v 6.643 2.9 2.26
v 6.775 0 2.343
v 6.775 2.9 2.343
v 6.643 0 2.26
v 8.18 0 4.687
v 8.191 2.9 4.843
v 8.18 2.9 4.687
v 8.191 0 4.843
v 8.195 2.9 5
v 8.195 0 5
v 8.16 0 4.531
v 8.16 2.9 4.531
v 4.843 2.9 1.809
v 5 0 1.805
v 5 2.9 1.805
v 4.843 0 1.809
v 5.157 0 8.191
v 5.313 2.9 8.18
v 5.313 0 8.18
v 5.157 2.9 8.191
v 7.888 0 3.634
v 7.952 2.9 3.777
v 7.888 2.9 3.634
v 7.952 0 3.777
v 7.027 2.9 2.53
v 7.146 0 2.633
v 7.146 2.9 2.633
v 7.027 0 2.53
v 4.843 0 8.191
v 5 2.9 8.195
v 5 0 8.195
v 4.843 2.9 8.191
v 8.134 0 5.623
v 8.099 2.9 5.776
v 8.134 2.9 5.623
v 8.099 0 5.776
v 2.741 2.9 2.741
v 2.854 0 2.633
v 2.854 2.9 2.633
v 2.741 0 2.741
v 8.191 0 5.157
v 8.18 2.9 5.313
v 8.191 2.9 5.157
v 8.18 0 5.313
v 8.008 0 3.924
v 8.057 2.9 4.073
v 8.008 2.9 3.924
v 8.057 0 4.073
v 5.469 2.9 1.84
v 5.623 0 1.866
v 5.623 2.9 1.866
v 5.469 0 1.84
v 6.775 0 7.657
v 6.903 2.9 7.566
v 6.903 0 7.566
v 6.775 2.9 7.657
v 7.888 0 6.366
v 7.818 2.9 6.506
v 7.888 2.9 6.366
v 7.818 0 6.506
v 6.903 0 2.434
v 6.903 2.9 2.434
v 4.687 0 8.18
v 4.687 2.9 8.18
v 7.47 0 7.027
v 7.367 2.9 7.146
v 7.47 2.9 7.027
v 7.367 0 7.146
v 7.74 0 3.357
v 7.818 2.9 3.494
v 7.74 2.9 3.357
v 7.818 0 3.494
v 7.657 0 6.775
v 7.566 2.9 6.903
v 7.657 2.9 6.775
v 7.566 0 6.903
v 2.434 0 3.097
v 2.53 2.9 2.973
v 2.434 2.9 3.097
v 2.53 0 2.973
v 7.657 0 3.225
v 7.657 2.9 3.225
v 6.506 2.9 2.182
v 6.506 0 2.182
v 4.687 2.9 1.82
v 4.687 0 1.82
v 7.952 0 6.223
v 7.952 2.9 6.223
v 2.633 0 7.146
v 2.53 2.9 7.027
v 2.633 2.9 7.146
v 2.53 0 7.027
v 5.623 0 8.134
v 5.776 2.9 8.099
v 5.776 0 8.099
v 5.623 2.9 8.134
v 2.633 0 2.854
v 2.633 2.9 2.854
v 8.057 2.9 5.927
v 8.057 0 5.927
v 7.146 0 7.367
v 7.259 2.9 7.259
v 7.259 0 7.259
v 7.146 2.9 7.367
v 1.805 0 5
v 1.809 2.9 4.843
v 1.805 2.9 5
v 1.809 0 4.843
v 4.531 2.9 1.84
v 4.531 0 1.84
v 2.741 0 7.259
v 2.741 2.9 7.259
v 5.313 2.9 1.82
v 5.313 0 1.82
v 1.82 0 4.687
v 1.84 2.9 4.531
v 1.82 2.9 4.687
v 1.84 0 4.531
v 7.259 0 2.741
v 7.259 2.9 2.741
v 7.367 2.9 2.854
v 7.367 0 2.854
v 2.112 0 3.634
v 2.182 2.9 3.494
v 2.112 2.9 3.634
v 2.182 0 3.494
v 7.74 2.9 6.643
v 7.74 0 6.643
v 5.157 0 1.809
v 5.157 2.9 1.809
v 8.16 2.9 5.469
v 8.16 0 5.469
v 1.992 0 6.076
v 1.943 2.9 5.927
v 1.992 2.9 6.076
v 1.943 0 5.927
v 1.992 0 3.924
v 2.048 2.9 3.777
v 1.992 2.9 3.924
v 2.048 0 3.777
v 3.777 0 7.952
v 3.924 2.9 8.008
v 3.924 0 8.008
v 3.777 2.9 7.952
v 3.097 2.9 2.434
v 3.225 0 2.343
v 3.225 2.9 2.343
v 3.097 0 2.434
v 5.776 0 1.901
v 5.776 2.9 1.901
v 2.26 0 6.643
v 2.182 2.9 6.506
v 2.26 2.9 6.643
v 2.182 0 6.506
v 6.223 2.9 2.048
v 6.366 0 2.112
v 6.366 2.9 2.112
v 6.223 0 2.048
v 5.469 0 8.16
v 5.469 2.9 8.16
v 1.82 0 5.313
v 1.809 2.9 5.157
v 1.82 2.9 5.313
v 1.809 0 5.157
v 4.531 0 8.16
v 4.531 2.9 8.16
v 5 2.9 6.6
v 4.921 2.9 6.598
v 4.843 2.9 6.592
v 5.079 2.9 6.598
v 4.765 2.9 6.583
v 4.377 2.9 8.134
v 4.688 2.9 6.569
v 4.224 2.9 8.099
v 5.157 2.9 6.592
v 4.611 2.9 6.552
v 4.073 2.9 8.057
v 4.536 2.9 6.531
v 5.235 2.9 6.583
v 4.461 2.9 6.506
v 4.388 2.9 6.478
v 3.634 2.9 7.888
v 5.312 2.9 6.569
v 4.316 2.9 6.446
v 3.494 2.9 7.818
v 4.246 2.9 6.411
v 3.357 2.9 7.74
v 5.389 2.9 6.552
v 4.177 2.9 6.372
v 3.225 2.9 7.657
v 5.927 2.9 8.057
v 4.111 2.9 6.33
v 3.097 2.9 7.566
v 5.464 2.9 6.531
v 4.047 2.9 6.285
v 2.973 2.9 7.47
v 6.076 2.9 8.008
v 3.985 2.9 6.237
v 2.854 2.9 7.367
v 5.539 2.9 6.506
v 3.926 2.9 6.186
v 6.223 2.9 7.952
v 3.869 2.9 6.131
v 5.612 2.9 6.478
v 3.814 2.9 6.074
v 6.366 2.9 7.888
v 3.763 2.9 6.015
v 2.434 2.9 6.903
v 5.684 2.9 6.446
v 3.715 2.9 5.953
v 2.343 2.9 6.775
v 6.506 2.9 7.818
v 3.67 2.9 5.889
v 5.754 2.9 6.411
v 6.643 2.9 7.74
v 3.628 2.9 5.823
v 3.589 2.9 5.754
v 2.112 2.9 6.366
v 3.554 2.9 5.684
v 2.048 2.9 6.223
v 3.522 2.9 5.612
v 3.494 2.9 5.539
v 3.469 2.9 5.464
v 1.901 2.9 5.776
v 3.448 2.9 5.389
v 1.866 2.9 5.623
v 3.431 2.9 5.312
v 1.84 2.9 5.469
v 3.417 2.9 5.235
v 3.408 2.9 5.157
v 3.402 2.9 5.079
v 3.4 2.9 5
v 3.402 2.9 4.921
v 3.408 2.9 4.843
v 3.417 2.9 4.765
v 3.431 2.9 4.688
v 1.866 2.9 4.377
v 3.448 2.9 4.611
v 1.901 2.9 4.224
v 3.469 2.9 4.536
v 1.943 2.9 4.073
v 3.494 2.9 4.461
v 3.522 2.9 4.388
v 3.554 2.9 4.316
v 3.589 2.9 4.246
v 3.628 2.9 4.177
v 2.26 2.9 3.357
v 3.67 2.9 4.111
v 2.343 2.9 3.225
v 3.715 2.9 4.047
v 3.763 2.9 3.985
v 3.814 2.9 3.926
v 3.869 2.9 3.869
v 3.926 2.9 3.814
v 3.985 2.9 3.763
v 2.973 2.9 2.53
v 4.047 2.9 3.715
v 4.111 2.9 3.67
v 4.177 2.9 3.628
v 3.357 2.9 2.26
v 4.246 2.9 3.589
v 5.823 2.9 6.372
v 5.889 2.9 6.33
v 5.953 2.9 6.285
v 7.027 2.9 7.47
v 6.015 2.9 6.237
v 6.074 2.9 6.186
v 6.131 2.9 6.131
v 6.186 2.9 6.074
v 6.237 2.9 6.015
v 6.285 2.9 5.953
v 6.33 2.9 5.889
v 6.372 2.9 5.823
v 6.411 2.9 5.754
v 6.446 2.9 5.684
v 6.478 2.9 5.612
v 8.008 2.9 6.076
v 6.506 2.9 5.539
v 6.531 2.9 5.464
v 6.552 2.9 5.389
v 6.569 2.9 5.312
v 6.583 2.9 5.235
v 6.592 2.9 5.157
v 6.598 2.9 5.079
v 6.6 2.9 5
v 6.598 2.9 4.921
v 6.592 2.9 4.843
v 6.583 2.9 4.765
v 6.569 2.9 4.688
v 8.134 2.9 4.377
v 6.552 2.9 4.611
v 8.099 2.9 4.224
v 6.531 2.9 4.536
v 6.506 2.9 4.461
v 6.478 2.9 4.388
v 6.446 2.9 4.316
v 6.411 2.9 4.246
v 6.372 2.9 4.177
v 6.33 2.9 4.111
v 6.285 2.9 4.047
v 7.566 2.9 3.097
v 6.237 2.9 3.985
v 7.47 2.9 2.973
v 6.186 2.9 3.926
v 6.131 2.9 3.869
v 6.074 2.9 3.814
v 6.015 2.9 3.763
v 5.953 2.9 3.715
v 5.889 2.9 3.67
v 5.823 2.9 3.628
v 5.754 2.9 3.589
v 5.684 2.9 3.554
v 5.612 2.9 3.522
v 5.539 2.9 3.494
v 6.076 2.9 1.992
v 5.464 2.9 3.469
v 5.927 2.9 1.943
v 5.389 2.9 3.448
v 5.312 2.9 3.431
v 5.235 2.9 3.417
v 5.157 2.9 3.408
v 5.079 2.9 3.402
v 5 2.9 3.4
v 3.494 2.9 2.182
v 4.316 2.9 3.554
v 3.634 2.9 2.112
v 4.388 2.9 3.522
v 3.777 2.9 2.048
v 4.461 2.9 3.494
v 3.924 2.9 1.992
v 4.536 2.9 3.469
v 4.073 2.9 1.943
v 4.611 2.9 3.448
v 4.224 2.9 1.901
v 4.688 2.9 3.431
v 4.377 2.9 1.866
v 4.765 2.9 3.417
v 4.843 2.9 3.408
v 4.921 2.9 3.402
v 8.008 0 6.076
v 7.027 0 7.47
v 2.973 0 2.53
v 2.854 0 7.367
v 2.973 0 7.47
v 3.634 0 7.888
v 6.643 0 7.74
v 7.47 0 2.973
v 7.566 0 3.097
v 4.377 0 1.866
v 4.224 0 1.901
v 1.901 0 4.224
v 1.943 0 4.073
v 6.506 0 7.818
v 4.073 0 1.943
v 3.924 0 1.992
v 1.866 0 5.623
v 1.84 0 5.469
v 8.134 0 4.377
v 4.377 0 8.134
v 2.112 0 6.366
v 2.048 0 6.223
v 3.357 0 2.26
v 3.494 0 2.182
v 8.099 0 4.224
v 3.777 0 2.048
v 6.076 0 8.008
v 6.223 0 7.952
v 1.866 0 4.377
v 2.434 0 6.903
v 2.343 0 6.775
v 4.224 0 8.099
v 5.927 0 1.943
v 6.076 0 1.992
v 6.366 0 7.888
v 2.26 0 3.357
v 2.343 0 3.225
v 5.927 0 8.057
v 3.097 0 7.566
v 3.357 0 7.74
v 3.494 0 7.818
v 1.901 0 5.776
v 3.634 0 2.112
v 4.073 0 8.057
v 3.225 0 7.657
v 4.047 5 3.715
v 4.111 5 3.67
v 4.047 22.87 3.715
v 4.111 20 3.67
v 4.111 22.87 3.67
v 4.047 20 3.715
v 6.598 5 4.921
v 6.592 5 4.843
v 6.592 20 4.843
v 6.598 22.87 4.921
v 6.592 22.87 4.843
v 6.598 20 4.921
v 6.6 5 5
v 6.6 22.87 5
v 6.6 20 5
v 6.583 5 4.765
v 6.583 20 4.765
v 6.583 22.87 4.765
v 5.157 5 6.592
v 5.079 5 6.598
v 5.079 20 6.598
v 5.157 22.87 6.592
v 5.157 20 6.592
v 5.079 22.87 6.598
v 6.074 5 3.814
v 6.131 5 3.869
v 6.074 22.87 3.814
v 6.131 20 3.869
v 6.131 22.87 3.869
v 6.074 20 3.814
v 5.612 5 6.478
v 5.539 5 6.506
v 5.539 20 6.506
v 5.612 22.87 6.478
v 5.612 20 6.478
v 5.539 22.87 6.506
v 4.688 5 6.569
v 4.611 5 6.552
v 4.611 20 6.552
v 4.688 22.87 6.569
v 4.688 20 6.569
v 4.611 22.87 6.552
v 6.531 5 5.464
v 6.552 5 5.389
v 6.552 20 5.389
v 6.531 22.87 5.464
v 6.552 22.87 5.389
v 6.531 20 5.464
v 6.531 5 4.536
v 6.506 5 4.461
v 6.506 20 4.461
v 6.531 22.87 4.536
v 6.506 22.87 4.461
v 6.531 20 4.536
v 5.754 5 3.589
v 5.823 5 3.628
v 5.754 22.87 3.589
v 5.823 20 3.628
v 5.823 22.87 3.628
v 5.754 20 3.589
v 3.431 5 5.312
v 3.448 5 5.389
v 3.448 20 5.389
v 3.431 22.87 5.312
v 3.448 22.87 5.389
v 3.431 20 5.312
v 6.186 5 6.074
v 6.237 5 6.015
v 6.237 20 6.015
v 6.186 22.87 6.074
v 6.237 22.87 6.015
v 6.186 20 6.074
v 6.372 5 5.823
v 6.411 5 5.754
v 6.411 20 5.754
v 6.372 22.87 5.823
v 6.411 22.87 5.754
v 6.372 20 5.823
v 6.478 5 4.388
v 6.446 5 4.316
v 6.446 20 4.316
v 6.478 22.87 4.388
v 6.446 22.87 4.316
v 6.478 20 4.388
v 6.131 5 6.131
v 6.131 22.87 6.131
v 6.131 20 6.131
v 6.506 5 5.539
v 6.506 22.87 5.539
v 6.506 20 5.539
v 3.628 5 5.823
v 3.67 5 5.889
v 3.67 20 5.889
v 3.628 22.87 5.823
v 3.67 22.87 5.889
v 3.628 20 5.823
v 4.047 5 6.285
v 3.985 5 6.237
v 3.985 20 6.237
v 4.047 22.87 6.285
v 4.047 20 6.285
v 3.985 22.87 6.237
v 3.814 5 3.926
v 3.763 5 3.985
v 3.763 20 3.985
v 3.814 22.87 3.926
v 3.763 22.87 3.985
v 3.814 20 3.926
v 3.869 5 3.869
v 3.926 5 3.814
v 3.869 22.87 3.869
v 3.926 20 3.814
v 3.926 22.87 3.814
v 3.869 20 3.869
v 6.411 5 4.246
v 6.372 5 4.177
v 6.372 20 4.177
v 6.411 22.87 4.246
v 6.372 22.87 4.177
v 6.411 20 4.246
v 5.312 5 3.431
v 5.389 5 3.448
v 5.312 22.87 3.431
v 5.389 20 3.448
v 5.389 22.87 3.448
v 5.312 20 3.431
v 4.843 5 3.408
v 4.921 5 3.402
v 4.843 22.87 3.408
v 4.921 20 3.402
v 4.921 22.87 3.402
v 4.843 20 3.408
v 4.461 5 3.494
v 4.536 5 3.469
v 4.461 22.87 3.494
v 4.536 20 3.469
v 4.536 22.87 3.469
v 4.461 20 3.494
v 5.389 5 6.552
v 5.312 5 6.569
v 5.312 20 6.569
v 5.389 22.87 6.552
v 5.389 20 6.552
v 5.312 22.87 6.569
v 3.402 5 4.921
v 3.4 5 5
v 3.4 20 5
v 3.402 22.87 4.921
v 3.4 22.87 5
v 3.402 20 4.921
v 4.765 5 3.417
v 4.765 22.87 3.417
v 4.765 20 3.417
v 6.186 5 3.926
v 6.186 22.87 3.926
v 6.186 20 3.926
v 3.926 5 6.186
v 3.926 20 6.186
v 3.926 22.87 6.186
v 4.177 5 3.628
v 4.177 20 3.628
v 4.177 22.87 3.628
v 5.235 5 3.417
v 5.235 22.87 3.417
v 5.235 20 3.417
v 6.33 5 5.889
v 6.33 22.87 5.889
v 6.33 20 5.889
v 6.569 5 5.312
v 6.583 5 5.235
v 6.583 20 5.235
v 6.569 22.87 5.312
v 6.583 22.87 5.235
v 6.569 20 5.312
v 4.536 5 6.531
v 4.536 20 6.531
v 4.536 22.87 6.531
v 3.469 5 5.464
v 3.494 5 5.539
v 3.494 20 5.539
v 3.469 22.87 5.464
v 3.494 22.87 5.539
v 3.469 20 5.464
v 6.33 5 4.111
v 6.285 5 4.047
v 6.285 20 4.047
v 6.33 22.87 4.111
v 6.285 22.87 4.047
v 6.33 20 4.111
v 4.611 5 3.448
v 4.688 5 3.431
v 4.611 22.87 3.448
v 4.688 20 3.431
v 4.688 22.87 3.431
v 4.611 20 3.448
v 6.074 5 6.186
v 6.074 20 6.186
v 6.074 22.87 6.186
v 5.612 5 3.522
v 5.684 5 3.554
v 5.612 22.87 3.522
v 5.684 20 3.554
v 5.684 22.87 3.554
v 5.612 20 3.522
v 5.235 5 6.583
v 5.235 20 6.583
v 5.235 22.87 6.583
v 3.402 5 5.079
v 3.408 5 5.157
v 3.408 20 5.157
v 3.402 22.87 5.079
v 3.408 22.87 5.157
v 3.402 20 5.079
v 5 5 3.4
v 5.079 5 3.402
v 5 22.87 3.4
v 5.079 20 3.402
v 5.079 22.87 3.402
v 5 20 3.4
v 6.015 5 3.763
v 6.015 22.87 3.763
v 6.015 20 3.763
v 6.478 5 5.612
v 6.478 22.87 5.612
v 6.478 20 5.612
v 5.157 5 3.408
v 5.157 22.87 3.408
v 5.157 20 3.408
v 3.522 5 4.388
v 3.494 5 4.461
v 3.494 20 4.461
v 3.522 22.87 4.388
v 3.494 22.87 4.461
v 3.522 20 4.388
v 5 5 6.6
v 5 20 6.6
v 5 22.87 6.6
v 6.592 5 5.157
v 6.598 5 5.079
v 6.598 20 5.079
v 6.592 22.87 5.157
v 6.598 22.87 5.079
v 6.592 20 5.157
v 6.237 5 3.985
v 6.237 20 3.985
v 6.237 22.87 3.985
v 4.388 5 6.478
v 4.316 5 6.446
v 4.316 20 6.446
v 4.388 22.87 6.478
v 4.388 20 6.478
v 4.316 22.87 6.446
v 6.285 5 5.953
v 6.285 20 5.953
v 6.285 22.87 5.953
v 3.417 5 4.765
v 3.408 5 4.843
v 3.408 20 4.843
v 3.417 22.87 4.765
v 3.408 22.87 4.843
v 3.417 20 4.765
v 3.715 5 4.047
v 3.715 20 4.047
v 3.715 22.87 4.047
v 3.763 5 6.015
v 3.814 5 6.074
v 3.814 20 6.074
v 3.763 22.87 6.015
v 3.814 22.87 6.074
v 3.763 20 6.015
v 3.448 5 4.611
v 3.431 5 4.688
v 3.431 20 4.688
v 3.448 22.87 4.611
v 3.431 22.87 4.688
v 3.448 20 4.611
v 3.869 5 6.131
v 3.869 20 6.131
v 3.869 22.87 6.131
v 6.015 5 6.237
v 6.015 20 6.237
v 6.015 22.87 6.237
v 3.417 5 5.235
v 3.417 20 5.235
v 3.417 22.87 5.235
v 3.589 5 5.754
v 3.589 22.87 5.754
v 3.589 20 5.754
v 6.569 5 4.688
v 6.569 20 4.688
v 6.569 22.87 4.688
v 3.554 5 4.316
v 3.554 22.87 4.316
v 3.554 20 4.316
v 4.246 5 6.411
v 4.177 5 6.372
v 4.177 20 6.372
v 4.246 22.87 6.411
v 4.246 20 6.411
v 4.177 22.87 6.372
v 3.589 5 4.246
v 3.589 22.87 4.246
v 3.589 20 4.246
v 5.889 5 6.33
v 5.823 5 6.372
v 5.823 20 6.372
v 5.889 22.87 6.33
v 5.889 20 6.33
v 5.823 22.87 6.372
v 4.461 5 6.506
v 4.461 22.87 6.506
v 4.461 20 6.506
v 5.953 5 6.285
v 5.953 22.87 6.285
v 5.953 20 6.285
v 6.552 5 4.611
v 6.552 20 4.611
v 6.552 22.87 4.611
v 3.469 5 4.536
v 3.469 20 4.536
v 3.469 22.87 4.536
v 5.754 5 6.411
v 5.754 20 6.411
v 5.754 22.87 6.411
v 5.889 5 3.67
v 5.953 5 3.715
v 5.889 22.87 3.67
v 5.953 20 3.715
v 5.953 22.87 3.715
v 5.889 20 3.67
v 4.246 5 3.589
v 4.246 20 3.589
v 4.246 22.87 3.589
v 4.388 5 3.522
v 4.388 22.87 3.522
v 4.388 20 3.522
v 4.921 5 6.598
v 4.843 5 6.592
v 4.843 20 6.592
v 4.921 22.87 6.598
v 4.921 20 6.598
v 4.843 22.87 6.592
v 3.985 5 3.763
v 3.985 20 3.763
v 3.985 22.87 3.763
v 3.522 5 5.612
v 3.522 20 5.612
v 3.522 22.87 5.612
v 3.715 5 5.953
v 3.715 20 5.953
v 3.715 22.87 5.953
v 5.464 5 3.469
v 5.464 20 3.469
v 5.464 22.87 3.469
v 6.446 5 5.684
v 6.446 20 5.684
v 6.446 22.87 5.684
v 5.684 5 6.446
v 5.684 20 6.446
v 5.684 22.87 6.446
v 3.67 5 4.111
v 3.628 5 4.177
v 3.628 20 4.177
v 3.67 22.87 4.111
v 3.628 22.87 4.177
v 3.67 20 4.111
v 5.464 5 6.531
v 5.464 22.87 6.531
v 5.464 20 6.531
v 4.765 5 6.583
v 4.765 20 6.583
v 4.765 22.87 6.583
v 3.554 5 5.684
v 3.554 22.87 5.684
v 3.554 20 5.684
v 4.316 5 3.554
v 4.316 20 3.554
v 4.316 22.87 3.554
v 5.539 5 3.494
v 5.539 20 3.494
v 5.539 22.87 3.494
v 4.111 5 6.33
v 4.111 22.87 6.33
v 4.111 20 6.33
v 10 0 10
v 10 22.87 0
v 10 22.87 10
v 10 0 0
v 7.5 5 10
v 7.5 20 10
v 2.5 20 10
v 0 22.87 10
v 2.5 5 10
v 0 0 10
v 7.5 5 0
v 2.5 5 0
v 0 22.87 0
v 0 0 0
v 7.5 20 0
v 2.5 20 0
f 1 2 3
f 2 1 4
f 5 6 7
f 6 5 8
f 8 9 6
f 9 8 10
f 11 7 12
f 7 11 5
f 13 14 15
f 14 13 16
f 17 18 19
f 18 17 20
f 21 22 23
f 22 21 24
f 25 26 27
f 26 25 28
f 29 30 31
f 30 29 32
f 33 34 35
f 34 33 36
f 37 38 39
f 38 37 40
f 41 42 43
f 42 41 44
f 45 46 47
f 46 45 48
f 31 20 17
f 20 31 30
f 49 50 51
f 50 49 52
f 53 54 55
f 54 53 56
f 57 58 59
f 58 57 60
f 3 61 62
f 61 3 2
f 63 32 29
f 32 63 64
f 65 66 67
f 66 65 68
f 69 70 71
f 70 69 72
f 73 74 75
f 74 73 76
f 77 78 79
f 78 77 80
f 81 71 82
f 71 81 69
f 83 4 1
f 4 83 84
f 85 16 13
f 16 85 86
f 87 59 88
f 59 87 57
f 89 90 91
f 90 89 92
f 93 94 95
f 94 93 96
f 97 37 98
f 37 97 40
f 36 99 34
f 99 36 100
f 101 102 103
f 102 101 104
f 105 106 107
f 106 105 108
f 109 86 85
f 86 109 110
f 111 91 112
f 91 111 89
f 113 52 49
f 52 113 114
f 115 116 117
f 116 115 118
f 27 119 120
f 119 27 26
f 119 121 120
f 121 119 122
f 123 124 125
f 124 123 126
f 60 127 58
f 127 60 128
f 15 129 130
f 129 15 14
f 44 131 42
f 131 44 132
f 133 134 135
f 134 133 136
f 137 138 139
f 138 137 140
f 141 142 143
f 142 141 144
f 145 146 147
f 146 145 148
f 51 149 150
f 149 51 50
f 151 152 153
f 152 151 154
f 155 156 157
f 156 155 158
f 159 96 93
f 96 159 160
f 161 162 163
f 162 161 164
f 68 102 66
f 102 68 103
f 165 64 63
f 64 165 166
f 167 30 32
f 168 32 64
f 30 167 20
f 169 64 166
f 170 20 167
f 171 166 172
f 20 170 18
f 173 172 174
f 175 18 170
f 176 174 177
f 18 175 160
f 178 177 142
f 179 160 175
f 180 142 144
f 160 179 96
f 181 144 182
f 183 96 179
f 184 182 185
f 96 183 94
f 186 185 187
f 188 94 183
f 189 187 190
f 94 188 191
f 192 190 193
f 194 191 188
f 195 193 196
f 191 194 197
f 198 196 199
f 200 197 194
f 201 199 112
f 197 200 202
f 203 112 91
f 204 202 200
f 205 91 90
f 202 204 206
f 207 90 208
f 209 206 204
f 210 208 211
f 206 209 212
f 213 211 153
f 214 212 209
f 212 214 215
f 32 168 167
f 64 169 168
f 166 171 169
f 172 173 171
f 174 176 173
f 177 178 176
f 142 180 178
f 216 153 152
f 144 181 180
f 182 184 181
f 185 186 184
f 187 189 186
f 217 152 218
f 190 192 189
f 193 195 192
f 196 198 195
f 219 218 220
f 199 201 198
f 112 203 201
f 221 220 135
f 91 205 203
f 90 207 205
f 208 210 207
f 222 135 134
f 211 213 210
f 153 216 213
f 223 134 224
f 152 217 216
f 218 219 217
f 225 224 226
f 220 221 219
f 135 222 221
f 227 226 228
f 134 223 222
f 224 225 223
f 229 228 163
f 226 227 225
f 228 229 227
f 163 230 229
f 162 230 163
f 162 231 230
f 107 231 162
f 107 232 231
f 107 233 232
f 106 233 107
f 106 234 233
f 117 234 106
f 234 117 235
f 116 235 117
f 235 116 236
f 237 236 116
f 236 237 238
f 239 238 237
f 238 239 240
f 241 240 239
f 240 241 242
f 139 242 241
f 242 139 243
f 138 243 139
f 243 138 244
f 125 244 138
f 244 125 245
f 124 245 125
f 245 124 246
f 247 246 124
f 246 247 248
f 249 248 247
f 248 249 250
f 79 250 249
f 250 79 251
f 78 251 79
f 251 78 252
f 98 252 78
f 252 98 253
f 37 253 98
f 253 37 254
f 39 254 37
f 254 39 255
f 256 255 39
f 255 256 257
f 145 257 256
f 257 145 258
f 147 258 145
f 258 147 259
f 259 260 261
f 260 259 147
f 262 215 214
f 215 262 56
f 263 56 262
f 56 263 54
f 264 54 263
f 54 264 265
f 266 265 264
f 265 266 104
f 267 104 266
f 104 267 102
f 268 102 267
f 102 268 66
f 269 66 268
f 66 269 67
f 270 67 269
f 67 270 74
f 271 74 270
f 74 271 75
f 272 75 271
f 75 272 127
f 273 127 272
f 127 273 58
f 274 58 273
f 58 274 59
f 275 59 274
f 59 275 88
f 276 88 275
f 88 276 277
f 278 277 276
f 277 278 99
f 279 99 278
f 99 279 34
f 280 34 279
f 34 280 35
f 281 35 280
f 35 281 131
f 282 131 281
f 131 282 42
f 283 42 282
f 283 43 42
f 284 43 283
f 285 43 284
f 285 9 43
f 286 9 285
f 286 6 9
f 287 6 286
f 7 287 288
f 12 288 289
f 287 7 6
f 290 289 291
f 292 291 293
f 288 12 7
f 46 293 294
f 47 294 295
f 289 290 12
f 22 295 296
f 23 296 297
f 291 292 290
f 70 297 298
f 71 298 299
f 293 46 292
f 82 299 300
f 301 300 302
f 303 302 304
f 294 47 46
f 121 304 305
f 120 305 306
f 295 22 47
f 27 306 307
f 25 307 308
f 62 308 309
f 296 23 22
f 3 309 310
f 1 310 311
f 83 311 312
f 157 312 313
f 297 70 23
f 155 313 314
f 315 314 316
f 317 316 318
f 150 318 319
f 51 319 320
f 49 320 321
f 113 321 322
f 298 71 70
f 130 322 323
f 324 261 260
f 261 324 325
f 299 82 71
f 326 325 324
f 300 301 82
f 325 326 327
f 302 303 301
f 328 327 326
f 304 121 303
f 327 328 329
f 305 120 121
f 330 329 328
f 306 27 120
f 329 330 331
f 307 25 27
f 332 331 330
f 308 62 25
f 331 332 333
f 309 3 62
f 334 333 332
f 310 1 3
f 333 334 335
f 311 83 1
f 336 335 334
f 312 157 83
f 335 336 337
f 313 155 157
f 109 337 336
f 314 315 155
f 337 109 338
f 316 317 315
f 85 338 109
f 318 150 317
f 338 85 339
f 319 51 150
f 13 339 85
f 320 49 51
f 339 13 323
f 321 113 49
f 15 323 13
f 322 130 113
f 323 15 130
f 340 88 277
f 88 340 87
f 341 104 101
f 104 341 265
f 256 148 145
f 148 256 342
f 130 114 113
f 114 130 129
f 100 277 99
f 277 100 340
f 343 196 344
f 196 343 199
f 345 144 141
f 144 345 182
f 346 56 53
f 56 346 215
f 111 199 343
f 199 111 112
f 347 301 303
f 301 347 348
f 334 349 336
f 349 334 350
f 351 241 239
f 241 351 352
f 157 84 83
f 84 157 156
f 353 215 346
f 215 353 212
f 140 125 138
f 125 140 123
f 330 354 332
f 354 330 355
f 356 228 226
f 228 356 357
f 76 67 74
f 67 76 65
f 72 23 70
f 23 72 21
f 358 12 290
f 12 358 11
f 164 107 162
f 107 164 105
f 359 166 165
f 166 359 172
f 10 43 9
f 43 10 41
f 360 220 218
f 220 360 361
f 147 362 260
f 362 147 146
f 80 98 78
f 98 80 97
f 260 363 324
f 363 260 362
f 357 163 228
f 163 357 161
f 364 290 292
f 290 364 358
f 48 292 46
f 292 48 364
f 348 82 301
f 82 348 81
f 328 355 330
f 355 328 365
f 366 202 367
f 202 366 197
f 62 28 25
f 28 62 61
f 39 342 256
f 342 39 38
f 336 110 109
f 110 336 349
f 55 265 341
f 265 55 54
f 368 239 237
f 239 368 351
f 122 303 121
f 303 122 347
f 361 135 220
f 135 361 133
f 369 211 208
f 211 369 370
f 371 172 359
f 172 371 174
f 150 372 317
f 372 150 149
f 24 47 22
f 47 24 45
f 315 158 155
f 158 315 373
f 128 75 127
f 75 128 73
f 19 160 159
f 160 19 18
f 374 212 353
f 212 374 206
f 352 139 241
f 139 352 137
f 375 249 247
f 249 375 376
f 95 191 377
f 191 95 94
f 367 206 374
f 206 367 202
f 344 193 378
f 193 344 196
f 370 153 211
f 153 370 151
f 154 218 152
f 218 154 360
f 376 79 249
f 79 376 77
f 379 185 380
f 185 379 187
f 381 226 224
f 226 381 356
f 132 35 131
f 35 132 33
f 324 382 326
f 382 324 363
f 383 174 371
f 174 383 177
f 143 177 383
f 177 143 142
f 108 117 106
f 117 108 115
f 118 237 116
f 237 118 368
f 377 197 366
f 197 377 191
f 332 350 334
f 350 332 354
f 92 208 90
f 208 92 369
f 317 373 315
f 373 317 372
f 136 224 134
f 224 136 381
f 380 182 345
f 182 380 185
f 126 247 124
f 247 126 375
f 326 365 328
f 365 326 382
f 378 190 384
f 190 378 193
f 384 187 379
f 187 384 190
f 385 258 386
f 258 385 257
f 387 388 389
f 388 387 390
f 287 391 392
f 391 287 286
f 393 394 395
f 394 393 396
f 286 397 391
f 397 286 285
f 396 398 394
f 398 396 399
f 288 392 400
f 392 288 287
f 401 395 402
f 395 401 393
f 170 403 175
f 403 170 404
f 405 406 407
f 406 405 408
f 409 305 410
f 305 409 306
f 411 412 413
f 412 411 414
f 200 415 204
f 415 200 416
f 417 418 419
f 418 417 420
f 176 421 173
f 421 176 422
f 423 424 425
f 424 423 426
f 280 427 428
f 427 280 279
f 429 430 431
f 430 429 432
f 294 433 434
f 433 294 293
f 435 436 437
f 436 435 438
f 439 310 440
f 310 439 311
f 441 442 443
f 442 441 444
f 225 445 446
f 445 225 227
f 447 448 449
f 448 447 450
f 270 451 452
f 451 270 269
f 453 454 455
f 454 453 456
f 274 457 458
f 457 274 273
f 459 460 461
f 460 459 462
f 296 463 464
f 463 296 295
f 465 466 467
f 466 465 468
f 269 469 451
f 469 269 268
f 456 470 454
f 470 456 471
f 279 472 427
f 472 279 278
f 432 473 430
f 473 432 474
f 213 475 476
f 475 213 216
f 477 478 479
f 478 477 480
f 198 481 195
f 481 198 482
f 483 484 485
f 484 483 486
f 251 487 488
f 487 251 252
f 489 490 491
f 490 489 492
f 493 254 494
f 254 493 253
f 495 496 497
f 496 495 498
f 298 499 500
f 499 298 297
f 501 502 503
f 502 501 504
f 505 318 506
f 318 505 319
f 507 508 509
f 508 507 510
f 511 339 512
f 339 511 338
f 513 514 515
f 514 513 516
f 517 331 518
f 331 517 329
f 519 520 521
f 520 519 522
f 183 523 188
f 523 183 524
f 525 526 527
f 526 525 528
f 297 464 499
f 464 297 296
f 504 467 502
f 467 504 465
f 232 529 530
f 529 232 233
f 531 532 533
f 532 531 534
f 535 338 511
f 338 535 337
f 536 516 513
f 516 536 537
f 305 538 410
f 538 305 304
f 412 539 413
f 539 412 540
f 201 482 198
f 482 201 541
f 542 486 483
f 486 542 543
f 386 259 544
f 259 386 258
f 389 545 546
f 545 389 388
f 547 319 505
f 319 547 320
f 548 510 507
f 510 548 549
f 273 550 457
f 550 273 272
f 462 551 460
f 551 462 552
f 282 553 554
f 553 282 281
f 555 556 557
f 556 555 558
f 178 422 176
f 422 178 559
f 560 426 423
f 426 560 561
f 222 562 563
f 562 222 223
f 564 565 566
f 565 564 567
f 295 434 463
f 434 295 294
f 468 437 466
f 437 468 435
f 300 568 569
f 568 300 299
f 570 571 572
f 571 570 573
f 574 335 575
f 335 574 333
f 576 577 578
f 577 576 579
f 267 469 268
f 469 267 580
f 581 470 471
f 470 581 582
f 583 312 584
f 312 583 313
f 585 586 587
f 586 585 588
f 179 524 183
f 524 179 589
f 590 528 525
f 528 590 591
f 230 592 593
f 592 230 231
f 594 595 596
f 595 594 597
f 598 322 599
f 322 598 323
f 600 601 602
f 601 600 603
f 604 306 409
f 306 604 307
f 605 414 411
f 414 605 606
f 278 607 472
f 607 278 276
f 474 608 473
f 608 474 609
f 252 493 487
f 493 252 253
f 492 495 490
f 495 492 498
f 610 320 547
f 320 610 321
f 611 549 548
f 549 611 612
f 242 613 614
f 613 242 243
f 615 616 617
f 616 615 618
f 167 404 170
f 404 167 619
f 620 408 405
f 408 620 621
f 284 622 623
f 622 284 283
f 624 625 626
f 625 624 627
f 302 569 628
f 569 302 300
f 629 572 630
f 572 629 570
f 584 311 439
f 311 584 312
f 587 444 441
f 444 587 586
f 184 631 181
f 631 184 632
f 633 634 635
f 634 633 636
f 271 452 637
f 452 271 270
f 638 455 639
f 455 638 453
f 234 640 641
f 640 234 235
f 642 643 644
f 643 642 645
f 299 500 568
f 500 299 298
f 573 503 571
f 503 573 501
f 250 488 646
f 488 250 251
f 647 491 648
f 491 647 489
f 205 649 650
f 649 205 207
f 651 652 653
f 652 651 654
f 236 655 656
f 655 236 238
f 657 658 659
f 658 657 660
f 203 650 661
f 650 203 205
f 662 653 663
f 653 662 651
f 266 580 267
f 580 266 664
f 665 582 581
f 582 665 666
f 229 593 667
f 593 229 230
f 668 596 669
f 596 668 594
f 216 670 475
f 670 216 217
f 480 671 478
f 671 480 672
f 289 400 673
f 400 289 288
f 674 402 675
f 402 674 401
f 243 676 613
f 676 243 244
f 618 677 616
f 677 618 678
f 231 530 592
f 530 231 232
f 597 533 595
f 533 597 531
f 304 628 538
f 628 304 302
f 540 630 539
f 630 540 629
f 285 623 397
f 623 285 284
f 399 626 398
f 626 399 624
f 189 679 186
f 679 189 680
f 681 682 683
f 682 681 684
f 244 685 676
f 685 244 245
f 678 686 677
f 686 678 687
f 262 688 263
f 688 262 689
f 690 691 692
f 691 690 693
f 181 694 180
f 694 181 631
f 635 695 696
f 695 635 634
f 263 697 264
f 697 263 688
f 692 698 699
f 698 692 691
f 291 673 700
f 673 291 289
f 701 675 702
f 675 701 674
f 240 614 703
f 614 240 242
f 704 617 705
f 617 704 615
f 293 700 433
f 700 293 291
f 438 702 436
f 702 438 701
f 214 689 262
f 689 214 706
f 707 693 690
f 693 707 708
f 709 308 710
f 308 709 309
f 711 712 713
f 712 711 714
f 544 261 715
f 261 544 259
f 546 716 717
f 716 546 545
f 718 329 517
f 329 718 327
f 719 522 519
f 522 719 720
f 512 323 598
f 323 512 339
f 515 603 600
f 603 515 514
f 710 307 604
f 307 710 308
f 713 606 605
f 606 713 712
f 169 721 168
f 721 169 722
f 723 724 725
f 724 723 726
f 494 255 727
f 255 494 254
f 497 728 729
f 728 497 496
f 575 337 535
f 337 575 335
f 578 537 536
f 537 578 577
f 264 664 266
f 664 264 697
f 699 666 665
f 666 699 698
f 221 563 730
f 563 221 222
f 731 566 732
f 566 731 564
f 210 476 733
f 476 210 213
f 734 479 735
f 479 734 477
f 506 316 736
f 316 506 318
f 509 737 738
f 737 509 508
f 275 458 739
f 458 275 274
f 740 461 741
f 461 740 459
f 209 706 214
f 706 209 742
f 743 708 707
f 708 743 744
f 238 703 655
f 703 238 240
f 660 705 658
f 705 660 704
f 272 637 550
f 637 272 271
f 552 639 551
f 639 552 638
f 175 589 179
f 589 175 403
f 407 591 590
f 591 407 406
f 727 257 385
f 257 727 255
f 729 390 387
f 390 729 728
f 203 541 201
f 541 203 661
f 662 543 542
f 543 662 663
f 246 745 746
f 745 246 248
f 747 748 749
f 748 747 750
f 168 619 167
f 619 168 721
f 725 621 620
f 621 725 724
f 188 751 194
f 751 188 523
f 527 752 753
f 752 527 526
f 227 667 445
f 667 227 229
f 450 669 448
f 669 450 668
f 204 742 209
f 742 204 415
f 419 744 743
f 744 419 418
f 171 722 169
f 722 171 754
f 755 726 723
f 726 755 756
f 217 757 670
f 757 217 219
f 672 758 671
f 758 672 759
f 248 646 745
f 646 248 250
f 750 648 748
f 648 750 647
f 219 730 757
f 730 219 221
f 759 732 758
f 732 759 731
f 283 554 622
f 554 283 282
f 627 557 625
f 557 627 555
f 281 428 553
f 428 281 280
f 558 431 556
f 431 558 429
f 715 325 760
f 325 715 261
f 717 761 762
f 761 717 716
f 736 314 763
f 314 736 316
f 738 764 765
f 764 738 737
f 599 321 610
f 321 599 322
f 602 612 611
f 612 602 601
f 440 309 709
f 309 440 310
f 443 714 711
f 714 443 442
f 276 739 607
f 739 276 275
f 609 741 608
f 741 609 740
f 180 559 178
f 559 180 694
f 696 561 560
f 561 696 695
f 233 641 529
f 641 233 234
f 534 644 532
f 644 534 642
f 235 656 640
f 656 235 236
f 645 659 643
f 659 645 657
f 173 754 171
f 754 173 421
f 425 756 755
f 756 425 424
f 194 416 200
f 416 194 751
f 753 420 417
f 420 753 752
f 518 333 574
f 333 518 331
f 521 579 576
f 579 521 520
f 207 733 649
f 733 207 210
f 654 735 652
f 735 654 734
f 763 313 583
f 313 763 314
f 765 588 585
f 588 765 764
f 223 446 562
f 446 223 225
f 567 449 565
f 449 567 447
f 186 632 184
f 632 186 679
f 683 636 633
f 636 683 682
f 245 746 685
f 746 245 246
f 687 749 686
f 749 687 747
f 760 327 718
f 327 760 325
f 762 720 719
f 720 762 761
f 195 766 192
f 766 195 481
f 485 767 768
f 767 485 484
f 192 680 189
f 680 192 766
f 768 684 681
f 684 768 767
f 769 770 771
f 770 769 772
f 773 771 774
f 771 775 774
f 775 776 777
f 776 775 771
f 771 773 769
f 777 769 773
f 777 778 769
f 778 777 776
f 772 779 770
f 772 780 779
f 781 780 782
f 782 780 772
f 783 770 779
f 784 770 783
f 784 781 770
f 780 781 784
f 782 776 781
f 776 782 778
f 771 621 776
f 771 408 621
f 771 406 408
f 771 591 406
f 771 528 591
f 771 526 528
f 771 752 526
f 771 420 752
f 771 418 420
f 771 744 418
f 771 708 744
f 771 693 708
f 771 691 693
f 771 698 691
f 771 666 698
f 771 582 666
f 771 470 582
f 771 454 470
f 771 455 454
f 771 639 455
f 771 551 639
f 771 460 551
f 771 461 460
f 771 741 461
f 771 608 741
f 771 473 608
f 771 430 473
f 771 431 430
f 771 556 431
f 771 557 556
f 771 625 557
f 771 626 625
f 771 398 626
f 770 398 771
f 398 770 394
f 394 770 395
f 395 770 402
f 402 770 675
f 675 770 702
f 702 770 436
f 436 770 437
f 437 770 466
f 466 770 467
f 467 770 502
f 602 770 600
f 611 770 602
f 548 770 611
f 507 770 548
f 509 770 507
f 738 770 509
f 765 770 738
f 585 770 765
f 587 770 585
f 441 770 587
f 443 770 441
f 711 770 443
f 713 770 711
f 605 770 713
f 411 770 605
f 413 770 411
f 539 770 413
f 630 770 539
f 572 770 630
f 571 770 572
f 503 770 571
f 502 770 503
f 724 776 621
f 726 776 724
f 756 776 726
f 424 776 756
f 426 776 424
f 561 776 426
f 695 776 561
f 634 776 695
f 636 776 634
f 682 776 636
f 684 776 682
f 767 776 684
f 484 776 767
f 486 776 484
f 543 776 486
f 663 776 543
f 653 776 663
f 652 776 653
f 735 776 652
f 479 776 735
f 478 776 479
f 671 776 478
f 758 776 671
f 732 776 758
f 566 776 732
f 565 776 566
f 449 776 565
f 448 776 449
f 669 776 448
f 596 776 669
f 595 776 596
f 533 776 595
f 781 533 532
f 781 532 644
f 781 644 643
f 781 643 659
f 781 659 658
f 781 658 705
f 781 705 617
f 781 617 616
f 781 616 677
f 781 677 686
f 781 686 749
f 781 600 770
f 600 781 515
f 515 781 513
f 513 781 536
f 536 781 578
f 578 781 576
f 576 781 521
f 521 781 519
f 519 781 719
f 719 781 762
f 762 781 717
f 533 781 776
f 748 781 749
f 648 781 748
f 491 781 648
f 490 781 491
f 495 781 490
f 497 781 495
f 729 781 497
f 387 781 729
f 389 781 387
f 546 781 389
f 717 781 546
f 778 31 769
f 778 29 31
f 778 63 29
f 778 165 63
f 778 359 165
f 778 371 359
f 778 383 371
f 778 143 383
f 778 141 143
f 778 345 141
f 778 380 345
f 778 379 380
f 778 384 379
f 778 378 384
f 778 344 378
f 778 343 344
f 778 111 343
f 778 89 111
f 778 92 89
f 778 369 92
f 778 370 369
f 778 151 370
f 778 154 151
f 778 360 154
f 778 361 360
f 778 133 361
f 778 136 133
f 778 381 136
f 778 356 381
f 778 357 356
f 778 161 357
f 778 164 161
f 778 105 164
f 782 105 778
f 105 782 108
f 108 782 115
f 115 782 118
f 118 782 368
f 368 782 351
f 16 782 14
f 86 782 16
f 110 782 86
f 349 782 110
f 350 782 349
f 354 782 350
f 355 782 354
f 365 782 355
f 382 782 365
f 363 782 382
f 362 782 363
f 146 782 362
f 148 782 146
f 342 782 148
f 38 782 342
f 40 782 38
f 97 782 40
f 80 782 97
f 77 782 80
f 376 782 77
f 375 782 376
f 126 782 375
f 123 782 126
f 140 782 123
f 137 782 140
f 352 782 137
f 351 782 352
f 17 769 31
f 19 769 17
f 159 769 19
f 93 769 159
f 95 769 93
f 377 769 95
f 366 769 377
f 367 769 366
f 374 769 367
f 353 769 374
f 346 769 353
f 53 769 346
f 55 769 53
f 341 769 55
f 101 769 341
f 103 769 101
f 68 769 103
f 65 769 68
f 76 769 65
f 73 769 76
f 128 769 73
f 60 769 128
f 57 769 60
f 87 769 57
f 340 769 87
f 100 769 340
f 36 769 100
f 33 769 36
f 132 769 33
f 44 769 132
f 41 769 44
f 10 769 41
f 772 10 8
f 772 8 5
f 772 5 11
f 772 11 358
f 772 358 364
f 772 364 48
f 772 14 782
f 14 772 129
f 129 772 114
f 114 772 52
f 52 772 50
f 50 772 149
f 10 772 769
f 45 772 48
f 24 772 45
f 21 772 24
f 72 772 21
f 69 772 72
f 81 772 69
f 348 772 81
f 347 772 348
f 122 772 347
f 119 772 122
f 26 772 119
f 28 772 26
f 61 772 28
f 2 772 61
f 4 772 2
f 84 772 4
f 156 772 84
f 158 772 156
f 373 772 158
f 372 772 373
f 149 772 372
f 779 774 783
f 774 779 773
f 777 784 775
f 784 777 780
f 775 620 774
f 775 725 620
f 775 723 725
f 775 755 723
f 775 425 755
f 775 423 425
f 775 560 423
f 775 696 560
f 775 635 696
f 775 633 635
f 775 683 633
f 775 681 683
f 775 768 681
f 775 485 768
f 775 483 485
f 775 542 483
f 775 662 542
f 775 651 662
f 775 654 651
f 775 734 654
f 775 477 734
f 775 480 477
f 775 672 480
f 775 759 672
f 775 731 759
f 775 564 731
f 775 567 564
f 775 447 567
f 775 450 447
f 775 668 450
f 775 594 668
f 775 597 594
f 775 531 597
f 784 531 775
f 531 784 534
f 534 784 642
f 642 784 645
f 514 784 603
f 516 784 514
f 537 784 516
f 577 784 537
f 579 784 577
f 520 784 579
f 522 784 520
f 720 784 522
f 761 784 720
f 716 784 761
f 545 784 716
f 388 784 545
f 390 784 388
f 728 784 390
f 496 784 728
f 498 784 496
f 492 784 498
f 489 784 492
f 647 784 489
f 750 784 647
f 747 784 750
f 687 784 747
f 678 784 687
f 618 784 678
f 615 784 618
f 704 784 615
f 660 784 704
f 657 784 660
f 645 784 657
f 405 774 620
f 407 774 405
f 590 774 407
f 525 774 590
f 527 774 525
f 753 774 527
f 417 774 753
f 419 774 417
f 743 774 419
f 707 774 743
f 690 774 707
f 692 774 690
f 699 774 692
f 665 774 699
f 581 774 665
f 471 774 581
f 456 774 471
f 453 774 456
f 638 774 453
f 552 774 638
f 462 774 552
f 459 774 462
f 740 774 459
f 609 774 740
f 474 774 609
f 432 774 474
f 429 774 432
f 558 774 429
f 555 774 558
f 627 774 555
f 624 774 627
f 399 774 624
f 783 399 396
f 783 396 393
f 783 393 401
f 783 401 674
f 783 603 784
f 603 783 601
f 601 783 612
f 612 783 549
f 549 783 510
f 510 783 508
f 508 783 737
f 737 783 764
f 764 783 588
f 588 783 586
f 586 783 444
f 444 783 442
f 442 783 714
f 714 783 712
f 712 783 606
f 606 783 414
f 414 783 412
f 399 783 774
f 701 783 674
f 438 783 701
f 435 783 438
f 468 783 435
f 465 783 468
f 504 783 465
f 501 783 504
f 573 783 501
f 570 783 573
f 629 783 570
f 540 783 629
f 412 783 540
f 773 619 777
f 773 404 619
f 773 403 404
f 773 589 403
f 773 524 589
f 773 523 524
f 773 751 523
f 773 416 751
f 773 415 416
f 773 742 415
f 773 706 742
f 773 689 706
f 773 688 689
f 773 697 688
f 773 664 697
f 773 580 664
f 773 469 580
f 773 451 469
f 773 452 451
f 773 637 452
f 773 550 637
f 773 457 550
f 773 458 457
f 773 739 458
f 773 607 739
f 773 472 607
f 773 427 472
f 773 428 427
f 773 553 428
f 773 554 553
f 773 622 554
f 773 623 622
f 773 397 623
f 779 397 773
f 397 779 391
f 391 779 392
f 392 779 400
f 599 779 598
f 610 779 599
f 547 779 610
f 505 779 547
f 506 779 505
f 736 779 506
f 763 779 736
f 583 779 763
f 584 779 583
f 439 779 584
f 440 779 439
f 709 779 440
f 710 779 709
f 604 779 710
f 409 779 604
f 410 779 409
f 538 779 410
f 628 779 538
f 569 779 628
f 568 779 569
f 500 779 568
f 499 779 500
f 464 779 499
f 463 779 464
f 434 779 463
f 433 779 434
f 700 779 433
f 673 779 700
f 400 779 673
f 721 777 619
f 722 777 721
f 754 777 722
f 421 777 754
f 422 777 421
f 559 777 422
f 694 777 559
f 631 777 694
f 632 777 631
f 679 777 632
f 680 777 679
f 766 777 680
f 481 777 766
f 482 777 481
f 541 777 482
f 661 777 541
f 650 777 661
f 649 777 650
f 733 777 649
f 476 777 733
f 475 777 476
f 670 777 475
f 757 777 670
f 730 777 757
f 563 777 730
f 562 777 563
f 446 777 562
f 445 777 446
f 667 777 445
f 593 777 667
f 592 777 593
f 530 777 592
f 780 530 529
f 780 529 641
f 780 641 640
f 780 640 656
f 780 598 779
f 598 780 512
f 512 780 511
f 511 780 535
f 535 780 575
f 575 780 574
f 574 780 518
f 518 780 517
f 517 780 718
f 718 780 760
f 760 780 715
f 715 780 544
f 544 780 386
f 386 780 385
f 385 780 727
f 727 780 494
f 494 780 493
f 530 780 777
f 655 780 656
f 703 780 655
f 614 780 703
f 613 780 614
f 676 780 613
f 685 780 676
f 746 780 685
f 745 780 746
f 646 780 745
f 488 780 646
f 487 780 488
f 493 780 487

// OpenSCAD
// precision-related
eps = 0.01;
$fn = $preview ? 64 : 128;

// M3 x 20
// threaded portion OD 2.92 ("3")
// threaded portion length 19.96 ("20")
// head OD 5.39
// head length 2.91
// hex driver clearance diameter 2.90

module bolt_clearance() {
    cylinder(2.91, d=5.39+1, center=false);
    translate([0, 0, 2.91-eps])
        cylinder(20, d=3+0.2, center=false);
}

module frame() {
    bolt_length = 2.91 + 19.96;
    difference() {
        cube([10, bolt_length, 10]);
        translate([10/2, -eps, 10/2])
        rotate([-90,0,0])
            bolt_clearance();
        translate([10/4, 5, -eps])
            cube([10/2, 15, 15]);
    }
}

frame();
